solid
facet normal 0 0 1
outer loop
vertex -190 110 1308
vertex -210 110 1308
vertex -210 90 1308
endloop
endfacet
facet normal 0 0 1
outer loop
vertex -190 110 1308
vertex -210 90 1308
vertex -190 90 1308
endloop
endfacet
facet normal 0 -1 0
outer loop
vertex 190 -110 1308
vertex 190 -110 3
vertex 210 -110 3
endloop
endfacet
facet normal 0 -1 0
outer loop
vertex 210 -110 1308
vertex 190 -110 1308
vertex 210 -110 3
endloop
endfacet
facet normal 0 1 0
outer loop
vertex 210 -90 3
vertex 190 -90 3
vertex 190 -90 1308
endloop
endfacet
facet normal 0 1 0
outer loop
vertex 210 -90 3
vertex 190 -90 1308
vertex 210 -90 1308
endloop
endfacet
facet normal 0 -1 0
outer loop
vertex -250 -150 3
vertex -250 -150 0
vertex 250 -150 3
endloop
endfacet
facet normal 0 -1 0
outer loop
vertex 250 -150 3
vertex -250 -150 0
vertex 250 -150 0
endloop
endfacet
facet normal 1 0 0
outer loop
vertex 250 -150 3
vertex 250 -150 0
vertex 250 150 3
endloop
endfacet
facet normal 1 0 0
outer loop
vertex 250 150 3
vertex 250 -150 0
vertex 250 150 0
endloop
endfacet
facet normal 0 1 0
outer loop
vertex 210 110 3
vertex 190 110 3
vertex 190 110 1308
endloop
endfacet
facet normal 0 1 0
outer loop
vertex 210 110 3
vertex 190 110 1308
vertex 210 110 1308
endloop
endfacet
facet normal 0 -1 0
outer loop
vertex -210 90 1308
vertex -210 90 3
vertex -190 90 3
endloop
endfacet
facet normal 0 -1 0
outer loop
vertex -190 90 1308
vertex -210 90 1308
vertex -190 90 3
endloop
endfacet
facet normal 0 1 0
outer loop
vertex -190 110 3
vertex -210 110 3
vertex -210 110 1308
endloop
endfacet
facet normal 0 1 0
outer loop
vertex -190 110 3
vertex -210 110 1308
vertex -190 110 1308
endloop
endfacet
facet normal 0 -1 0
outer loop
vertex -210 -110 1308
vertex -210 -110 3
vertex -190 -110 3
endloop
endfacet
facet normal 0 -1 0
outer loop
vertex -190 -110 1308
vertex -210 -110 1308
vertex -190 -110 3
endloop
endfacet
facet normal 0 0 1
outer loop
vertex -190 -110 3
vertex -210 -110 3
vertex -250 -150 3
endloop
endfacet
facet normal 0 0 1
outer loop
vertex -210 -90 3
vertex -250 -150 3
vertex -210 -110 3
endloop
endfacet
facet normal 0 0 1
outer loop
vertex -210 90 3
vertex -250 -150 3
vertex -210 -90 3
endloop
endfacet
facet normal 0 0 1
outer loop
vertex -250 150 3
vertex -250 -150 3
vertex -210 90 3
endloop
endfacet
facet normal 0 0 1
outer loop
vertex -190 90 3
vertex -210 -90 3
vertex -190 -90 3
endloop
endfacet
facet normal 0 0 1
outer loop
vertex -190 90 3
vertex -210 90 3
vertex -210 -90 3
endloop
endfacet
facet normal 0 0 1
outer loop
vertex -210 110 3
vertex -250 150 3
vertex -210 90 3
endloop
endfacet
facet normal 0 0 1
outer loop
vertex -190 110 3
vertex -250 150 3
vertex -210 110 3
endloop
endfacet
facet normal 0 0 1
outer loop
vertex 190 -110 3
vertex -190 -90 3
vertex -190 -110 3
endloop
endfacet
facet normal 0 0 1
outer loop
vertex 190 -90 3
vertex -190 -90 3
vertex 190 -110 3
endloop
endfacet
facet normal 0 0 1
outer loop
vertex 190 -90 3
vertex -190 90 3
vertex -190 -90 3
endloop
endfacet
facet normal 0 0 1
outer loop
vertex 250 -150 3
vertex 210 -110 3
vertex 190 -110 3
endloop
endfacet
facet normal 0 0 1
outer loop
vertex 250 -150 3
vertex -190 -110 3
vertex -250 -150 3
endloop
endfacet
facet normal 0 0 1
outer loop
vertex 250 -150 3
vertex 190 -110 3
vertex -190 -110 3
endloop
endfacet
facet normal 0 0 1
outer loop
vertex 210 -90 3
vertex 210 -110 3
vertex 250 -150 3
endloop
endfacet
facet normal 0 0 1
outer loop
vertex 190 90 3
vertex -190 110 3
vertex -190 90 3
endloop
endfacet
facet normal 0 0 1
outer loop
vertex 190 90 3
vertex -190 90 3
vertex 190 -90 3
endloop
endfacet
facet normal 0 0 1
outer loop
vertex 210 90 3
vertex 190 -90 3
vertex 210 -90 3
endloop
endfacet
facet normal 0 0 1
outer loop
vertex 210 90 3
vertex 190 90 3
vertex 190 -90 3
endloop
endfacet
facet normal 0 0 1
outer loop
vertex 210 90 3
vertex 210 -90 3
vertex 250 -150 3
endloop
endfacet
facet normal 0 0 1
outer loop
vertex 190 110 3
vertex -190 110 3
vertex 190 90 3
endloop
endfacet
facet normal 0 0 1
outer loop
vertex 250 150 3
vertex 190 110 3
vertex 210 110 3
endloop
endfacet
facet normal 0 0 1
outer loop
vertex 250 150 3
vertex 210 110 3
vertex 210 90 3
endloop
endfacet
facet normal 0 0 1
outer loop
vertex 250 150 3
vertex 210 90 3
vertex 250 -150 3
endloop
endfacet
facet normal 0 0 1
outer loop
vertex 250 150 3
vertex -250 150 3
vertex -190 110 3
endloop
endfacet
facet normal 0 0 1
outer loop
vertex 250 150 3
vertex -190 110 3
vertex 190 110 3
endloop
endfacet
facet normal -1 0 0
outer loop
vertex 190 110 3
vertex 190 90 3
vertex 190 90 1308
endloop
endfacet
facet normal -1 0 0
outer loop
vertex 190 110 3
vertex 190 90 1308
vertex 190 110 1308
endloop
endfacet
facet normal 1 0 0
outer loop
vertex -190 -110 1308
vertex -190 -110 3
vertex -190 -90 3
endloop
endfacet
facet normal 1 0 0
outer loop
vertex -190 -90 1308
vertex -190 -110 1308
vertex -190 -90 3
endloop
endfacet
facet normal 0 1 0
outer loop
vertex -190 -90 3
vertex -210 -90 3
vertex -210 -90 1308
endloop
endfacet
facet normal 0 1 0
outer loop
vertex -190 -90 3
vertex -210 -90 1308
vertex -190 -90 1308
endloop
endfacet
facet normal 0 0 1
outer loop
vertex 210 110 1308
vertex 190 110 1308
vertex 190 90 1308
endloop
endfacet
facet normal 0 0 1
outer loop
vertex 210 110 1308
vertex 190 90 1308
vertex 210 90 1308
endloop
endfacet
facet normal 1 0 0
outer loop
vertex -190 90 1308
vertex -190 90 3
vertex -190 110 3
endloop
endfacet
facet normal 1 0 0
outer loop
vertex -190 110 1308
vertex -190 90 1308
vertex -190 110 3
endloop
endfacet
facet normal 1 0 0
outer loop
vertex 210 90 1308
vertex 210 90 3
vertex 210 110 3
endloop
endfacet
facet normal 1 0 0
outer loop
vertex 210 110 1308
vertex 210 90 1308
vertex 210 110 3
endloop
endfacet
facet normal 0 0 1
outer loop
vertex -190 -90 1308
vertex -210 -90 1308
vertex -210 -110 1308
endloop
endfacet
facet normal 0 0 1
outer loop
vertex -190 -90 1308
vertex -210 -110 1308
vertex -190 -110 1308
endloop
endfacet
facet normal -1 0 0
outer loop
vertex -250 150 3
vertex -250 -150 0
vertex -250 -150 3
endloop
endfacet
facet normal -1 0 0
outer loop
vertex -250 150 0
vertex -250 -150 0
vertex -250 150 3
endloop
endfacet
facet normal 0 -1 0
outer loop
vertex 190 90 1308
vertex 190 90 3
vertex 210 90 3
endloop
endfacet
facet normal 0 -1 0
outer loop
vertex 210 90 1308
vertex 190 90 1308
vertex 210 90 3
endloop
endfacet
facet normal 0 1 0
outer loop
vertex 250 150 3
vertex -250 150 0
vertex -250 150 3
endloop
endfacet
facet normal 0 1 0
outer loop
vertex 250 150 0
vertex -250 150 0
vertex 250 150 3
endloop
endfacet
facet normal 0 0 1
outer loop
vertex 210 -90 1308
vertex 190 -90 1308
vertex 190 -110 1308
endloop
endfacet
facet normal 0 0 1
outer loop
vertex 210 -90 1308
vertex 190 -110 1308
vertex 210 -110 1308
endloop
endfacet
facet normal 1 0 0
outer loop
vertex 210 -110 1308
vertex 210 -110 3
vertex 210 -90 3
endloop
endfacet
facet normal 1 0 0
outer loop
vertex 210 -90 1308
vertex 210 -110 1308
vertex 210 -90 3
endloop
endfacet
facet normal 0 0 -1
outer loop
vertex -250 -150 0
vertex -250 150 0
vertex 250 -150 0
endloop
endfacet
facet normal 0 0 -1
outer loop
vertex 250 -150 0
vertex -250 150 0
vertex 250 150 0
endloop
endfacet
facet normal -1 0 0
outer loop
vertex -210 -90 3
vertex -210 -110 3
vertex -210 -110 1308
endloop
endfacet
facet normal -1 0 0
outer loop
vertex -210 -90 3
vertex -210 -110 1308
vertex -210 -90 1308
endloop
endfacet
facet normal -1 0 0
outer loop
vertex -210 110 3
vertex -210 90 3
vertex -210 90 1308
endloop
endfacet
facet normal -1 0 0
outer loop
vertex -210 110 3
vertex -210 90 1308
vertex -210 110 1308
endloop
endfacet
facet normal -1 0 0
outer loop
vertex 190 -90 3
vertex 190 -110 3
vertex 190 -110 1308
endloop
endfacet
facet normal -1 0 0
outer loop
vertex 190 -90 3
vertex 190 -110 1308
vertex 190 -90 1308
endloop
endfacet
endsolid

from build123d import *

# Parameters (mm, degrees)
SCHIZZO1_W                       = 500
SCHIZZO1_H                       = 300
ESTRUSIONE_ESTRUSIONE1_DEPTH     = 3
SCHIZZO2_W                       = 20
SCHIZZO2_H                       = 20
ESTRUSIONE_ESTRUSIONE2_DEPTH     = 1305
RIPETIZIONE_A_L1_COUNT           = 2
RIPETIZIONE_A_L1_PITCH           = 400
RIPETIZIONE_A_L2_COUNT           = 2
RIPETIZIONE_A_L2_PITCH           = 200
RIPETIZIONE_A_L2_COPY_1_SKETCH_W = 20
RIPETIZIONE_A_L2_COPY_1_SKETCH_H = 20
RIPETIZIONE_A_L2_COPY_1_DEPTH    = 1305


with BuildPart() as part:
    # Schizzo1 → Estrusione-Estrusione1 (new body)
    with BuildSketch(Plane.XY):
        Rectangle(SCHIZZO1_W, SCHIZZO1_H)
    extrude(amount=ESTRUSIONE_ESTRUSIONE1_DEPTH)

    # Schizzo2 → Estrusione-Estrusione2 (add)
    with BuildSketch(Plane.XY.offset(3)):
        with Locations((-200, 100)):
            Rectangle(SCHIZZO2_W, SCHIZZO2_H)
    estrusione_estrusione2 = extrude(amount=ESTRUSIONE_ESTRUSIONE2_DEPTH)

    # Ripetizione a L1: Estrusione-Estrusione2 ×2
    with Locations(*[(i * RIPETIZIONE_A_L1_PITCH, 0, 0) for i in range(1, RIPETIZIONE_A_L1_COUNT)]):
        add(estrusione_estrusione2)

    # Ripetizione a L2: Estrusione-Estrusione2 ×2
    with Locations(*[(0, -i * RIPETIZIONE_A_L2_PITCH, 0) for i in range(1, RIPETIZIONE_A_L2_COUNT)]):
        add(estrusione_estrusione2)

    # Ripetizione a L2 copy 1 sketch → Ripetizione a L2 copy 1 (add)
    with BuildSketch(Plane(origin=(400, -200, 3), x_dir=(1, 0, 0), z_dir=(0, 0, 1))):
        with Locations((-200, 100)):
            Rectangle(RIPETIZIONE_A_L2_COPY_1_SKETCH_W, RIPETIZIONE_A_L2_COPY_1_SKETCH_H)
    extrude(amount=RIPETIZIONE_A_L2_COPY_1_DEPTH)


solid = part.part
